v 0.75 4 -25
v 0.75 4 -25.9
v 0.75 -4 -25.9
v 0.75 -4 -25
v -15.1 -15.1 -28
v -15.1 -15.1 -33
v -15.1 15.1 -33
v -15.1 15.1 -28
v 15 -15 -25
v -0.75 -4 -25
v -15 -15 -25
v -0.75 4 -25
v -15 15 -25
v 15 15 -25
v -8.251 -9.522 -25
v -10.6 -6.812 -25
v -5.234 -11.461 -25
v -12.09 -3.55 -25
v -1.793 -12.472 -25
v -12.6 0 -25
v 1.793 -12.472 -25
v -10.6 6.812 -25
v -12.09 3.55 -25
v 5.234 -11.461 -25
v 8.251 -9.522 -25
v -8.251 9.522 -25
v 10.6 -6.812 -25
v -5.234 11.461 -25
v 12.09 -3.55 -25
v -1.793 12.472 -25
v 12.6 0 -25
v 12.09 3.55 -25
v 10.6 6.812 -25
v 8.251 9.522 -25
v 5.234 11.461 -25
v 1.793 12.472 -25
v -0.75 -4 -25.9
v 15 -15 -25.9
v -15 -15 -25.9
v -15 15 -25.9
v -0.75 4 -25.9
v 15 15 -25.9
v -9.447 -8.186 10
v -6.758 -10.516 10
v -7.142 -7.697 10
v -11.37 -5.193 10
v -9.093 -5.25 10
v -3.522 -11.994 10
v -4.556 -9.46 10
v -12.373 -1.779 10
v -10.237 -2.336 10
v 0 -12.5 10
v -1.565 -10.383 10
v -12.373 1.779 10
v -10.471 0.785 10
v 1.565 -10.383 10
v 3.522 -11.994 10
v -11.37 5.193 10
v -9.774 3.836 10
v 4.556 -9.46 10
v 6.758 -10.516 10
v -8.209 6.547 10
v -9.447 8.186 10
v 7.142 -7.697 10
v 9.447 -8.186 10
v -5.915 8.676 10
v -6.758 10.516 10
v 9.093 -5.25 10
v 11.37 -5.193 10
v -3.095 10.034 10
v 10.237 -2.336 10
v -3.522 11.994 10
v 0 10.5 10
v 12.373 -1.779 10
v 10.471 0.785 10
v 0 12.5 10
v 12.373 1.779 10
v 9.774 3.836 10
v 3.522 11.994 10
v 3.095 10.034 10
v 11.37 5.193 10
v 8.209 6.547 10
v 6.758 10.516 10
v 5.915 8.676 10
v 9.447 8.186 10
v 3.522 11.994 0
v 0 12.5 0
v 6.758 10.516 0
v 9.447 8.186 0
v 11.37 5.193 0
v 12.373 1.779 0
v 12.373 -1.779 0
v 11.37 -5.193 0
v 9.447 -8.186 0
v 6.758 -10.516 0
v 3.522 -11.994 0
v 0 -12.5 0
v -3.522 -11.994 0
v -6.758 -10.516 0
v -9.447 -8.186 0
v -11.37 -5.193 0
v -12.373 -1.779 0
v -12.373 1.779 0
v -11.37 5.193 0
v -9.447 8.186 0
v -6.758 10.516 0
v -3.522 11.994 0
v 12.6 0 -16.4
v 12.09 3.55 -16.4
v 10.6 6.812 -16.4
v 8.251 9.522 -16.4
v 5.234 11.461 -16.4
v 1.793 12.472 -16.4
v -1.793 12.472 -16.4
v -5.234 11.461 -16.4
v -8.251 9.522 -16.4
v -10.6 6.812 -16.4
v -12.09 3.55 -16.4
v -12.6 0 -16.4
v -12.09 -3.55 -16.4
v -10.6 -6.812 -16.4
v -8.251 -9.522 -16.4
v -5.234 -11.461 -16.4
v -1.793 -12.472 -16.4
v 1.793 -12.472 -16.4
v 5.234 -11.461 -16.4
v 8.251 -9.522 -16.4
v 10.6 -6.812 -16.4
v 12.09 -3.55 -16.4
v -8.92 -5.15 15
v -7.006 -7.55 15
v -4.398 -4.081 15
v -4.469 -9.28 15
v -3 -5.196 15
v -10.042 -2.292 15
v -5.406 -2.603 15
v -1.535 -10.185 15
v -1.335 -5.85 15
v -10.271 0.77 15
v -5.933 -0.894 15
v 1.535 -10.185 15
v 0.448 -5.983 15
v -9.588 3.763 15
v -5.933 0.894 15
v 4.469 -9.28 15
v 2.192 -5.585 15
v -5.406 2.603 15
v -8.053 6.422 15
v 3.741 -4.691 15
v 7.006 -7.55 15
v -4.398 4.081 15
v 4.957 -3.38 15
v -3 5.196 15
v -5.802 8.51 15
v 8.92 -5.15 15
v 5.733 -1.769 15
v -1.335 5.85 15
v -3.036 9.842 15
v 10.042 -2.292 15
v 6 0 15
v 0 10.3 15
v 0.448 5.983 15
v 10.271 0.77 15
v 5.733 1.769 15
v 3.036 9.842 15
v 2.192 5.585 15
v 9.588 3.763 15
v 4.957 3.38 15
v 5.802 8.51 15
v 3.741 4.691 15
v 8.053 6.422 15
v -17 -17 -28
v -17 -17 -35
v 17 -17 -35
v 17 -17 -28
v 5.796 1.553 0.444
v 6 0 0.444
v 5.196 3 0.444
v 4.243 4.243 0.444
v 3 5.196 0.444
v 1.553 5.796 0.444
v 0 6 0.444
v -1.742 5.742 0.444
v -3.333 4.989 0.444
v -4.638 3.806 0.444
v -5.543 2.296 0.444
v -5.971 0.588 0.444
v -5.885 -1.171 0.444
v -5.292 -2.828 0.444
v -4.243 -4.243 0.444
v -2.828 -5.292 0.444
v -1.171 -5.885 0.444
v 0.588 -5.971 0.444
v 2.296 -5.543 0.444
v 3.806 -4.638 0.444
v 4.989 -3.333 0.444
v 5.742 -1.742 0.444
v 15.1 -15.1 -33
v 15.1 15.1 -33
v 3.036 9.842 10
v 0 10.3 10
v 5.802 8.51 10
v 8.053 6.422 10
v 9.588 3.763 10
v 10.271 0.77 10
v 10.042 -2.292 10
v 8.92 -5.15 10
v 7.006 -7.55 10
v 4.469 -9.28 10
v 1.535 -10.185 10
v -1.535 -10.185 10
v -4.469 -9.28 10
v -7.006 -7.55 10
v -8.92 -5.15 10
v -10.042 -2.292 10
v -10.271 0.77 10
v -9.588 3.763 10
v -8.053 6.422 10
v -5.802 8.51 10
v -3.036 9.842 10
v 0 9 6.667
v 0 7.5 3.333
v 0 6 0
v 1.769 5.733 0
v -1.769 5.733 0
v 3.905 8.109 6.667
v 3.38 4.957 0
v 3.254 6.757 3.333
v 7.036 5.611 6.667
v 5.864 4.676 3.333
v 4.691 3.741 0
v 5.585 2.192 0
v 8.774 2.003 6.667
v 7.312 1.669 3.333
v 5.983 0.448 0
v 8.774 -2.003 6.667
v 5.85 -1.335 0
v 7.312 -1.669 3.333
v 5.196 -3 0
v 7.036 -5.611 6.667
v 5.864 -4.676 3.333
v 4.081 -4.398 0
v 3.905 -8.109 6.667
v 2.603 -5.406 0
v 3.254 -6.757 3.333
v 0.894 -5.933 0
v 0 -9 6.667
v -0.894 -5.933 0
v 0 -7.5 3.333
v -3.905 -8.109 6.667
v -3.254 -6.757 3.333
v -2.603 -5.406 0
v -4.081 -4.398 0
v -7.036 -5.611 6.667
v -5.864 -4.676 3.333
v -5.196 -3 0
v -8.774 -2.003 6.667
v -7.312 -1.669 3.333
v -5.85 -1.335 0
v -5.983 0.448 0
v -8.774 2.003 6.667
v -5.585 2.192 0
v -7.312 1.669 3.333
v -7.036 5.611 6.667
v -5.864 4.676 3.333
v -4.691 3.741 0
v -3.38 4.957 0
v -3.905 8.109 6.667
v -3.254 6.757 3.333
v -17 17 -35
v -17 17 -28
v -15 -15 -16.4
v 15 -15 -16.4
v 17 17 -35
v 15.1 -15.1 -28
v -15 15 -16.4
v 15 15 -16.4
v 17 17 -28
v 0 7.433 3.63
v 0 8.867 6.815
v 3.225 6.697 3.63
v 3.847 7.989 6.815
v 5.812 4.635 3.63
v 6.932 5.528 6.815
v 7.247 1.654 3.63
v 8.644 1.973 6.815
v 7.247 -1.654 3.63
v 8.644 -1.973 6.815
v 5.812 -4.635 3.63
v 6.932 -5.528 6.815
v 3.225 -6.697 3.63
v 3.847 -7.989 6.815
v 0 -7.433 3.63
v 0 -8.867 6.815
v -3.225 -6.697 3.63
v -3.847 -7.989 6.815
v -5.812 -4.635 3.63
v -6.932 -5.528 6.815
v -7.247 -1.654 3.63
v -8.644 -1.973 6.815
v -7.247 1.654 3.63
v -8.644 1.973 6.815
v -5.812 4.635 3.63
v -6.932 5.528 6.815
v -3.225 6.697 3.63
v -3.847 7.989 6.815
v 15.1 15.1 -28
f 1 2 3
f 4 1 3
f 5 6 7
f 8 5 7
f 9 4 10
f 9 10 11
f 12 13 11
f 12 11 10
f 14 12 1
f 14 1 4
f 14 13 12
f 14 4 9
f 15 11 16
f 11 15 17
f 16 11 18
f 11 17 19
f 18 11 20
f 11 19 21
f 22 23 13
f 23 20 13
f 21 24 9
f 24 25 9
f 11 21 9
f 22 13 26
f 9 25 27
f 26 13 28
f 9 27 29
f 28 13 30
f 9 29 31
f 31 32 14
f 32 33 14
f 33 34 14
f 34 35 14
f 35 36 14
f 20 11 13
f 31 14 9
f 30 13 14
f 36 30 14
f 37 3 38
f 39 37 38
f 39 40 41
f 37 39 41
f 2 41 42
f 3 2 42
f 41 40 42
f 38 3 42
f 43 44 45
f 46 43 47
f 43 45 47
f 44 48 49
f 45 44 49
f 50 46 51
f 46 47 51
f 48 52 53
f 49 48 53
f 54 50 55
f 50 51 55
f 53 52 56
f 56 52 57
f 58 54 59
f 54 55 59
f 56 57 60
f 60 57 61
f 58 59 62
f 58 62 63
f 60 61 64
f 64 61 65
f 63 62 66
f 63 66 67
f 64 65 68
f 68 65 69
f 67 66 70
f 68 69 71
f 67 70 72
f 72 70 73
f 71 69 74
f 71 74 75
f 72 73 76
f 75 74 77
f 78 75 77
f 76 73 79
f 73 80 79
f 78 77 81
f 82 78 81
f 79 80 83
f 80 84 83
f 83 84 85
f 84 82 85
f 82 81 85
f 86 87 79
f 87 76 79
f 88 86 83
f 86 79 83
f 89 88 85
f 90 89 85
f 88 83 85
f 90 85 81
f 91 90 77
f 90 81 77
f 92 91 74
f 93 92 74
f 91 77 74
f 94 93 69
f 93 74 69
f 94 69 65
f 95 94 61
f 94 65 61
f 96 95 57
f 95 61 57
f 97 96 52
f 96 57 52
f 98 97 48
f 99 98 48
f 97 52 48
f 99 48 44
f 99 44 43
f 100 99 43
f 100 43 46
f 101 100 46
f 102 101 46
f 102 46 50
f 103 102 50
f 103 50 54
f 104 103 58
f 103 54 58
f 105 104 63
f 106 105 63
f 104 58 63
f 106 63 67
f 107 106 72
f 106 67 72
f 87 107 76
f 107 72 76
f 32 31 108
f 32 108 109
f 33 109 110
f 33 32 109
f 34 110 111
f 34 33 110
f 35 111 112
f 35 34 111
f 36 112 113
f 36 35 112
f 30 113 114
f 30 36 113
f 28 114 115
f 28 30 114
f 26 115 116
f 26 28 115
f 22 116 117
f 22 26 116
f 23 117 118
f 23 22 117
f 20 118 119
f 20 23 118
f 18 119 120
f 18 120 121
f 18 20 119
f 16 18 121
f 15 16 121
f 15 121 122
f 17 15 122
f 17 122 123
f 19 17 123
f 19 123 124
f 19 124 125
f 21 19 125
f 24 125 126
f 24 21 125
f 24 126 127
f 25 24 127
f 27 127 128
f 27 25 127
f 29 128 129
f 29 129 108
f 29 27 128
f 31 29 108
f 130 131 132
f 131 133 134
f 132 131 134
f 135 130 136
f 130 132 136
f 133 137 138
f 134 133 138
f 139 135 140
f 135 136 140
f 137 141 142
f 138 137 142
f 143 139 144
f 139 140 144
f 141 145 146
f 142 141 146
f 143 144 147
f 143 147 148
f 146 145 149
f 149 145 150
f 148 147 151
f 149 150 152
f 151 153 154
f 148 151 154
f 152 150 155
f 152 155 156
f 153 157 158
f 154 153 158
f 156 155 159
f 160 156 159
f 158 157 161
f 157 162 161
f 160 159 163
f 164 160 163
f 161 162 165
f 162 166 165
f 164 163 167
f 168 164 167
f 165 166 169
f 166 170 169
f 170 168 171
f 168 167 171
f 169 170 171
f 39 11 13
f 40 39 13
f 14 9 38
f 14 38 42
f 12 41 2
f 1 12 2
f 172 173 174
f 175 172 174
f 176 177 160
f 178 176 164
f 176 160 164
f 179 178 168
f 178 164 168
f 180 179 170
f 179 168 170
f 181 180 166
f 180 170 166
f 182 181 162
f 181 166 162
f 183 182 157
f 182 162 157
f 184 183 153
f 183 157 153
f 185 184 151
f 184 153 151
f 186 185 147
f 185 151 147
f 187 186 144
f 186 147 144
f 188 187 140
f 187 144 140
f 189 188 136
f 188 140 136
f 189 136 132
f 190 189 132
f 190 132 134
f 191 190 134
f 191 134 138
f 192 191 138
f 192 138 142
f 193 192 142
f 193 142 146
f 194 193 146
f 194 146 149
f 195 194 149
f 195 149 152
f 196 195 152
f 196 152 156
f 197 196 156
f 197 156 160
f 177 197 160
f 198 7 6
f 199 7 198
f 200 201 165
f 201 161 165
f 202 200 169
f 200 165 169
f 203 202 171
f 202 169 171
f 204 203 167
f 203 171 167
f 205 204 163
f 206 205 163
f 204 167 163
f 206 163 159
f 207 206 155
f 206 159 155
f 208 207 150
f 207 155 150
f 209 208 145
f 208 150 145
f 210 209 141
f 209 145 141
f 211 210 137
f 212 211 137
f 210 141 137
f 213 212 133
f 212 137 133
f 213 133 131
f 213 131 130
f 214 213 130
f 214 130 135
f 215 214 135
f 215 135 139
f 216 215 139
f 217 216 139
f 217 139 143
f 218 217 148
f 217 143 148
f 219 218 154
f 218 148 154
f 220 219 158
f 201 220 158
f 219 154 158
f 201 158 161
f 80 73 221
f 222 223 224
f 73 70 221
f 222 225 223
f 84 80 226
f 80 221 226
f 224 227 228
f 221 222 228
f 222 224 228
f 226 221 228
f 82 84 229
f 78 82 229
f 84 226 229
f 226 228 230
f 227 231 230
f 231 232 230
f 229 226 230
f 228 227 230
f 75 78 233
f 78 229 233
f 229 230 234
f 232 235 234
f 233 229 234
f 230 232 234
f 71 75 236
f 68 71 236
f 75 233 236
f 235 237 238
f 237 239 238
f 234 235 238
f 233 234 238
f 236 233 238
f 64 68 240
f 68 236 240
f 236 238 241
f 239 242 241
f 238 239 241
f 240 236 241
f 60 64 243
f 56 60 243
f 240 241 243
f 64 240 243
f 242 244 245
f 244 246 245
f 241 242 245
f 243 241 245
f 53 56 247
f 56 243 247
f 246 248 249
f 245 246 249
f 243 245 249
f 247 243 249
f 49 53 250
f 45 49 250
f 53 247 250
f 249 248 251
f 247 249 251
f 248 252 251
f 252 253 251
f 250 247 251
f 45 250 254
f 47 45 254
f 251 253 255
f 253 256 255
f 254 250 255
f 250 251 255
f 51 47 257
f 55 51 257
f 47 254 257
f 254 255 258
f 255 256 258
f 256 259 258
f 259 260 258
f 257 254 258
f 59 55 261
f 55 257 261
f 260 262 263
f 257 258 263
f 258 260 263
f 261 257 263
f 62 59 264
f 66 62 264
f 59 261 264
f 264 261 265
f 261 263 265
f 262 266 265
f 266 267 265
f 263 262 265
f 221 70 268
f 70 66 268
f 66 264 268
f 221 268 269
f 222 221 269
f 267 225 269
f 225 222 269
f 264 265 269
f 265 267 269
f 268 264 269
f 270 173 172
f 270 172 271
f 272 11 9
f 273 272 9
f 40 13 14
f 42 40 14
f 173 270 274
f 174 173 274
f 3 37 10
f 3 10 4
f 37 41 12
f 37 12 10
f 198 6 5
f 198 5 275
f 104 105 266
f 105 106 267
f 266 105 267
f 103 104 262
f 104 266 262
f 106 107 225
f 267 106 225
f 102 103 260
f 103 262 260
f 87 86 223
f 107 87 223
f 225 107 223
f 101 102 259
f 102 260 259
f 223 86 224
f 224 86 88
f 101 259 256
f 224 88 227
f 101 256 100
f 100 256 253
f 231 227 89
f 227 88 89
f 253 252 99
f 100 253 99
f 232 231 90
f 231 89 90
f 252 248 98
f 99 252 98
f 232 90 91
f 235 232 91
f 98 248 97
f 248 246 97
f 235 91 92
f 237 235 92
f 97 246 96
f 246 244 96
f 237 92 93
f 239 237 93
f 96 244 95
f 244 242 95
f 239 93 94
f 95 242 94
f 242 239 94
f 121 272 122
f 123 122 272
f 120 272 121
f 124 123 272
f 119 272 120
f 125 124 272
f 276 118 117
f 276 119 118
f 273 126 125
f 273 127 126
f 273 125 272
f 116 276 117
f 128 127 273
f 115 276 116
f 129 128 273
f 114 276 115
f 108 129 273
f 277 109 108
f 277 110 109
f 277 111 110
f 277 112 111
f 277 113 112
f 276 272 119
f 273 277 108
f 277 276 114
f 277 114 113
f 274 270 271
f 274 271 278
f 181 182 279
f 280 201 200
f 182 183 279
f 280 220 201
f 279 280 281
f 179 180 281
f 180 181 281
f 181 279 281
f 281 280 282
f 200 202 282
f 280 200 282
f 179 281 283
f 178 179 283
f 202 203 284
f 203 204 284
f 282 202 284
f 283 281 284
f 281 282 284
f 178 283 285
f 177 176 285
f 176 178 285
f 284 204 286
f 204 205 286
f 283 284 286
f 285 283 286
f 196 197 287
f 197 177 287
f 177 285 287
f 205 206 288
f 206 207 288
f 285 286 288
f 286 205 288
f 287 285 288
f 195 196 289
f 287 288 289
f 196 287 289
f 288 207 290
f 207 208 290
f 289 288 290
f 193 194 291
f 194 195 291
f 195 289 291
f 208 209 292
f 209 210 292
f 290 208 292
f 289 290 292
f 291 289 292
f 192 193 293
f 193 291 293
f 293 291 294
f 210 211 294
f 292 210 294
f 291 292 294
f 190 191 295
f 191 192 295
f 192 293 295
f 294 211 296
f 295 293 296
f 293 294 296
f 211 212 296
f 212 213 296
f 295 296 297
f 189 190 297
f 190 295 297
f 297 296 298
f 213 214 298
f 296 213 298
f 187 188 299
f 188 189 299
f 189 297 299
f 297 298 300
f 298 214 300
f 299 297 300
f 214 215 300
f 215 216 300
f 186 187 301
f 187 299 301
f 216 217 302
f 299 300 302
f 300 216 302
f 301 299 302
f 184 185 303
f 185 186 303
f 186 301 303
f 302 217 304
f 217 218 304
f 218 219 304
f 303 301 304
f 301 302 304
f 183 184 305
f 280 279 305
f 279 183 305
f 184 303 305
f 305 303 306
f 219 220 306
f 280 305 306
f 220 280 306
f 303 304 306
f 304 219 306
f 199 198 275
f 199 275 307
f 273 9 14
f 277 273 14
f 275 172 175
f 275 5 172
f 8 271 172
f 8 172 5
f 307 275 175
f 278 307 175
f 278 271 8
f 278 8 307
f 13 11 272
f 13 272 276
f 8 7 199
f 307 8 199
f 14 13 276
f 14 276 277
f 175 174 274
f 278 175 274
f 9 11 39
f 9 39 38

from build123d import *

# Parameters (mm, degrees)
F6_R      = 6
F7_DEPTH  = 15
F9_W      = 30
F9_H      = 30
F9_R      = 12.6
F10_DEPTH = 8.6
F11_DEPTH = 0.9
F12_W     = 1.5
F12_H     = 8
F13_DEPTH = 0.9
F15_W     = 34
F15_H     = 34
F15_W_2   = 30.2
F15_H_2   = 30.2
F16_DEPTH = 2
F17_DEPTH = 7


with BuildPart() as f5:
    # F4 (on Right) → F5 (revolve)
    with BuildSketch(Plane.YZ):
        Polygon((12.5, 10), (10.5, 10), (6, 0), (12.5, 0), align=None)
    revolve(axis=Axis((0, 0, 7.975027198), (0, 0, -1)))


with BuildPart() as f5b:
    # F4 (on Right) → F5, piece 2 (revolve)
    with BuildSketch(Plane.YZ):
        Polygon((0, 15), (0, 0), (5.8, 0), (10.3, 10), (10.3, 15), align=None)
    revolve(axis=Axis((0, 0, 7.975027198), (0, 0, -1)))

    # F6 (on face) → F7 (cut, through all)
    with BuildSketch(Plane.XY.offset(15)):
        Circle(F6_R)
    extrude(amount=-F7_DEPTH, mode=Mode.SUBTRACT)


with BuildPart() as f10:
    # F9 (on offset) → F10 (new body)
    with BuildSketch(Plane.XY.offset(-25)):
        Rectangle(F9_W, F9_H)
        Circle(F9_R, mode=Mode.SUBTRACT)
    extrude(amount=F10_DEPTH)


with BuildPart() as f11:
    # F9 (on offset) → F11 (new body)
    with BuildSketch(Plane.XY.offset(-25)):
        Rectangle(F9_W, F9_H)
        Circle(F9_R, mode=Mode.SUBTRACT)
        Circle(F9_R)
    extrude(amount=-F11_DEPTH)

    # F12 (on face) → F13 (cut, through all)
    with BuildSketch(Plane(origin=(0, 0, -25.9), x_dir=(1, 0, 0), z_dir=(0, 0, -1))):
        Rectangle(F12_W, F12_H)
    extrude(amount=-F13_DEPTH, mode=Mode.SUBTRACT)


with BuildPart() as f16:
    # F15 (on offset) → F16 (new body)
    with BuildSketch(Plane.XY.offset(-35)):
        Rectangle(F15_W, F15_H)
        Rectangle(F15_W_2, F15_H_2, mode=Mode.SUBTRACT)
        Rectangle(F15_W_2, F15_H_2)
    extrude(amount=F16_DEPTH)

    # F15 (on offset) → F17 (join)
    with BuildSketch(Plane.XY.offset(-35)):
        Rectangle(F15_W, F15_H)
        Rectangle(F15_W_2, F15_H_2, mode=Mode.SUBTRACT)
    extrude(amount=F17_DEPTH)


solid = Compound([f5.part, f5b.part, f10.part, f11.part, f16.part])
